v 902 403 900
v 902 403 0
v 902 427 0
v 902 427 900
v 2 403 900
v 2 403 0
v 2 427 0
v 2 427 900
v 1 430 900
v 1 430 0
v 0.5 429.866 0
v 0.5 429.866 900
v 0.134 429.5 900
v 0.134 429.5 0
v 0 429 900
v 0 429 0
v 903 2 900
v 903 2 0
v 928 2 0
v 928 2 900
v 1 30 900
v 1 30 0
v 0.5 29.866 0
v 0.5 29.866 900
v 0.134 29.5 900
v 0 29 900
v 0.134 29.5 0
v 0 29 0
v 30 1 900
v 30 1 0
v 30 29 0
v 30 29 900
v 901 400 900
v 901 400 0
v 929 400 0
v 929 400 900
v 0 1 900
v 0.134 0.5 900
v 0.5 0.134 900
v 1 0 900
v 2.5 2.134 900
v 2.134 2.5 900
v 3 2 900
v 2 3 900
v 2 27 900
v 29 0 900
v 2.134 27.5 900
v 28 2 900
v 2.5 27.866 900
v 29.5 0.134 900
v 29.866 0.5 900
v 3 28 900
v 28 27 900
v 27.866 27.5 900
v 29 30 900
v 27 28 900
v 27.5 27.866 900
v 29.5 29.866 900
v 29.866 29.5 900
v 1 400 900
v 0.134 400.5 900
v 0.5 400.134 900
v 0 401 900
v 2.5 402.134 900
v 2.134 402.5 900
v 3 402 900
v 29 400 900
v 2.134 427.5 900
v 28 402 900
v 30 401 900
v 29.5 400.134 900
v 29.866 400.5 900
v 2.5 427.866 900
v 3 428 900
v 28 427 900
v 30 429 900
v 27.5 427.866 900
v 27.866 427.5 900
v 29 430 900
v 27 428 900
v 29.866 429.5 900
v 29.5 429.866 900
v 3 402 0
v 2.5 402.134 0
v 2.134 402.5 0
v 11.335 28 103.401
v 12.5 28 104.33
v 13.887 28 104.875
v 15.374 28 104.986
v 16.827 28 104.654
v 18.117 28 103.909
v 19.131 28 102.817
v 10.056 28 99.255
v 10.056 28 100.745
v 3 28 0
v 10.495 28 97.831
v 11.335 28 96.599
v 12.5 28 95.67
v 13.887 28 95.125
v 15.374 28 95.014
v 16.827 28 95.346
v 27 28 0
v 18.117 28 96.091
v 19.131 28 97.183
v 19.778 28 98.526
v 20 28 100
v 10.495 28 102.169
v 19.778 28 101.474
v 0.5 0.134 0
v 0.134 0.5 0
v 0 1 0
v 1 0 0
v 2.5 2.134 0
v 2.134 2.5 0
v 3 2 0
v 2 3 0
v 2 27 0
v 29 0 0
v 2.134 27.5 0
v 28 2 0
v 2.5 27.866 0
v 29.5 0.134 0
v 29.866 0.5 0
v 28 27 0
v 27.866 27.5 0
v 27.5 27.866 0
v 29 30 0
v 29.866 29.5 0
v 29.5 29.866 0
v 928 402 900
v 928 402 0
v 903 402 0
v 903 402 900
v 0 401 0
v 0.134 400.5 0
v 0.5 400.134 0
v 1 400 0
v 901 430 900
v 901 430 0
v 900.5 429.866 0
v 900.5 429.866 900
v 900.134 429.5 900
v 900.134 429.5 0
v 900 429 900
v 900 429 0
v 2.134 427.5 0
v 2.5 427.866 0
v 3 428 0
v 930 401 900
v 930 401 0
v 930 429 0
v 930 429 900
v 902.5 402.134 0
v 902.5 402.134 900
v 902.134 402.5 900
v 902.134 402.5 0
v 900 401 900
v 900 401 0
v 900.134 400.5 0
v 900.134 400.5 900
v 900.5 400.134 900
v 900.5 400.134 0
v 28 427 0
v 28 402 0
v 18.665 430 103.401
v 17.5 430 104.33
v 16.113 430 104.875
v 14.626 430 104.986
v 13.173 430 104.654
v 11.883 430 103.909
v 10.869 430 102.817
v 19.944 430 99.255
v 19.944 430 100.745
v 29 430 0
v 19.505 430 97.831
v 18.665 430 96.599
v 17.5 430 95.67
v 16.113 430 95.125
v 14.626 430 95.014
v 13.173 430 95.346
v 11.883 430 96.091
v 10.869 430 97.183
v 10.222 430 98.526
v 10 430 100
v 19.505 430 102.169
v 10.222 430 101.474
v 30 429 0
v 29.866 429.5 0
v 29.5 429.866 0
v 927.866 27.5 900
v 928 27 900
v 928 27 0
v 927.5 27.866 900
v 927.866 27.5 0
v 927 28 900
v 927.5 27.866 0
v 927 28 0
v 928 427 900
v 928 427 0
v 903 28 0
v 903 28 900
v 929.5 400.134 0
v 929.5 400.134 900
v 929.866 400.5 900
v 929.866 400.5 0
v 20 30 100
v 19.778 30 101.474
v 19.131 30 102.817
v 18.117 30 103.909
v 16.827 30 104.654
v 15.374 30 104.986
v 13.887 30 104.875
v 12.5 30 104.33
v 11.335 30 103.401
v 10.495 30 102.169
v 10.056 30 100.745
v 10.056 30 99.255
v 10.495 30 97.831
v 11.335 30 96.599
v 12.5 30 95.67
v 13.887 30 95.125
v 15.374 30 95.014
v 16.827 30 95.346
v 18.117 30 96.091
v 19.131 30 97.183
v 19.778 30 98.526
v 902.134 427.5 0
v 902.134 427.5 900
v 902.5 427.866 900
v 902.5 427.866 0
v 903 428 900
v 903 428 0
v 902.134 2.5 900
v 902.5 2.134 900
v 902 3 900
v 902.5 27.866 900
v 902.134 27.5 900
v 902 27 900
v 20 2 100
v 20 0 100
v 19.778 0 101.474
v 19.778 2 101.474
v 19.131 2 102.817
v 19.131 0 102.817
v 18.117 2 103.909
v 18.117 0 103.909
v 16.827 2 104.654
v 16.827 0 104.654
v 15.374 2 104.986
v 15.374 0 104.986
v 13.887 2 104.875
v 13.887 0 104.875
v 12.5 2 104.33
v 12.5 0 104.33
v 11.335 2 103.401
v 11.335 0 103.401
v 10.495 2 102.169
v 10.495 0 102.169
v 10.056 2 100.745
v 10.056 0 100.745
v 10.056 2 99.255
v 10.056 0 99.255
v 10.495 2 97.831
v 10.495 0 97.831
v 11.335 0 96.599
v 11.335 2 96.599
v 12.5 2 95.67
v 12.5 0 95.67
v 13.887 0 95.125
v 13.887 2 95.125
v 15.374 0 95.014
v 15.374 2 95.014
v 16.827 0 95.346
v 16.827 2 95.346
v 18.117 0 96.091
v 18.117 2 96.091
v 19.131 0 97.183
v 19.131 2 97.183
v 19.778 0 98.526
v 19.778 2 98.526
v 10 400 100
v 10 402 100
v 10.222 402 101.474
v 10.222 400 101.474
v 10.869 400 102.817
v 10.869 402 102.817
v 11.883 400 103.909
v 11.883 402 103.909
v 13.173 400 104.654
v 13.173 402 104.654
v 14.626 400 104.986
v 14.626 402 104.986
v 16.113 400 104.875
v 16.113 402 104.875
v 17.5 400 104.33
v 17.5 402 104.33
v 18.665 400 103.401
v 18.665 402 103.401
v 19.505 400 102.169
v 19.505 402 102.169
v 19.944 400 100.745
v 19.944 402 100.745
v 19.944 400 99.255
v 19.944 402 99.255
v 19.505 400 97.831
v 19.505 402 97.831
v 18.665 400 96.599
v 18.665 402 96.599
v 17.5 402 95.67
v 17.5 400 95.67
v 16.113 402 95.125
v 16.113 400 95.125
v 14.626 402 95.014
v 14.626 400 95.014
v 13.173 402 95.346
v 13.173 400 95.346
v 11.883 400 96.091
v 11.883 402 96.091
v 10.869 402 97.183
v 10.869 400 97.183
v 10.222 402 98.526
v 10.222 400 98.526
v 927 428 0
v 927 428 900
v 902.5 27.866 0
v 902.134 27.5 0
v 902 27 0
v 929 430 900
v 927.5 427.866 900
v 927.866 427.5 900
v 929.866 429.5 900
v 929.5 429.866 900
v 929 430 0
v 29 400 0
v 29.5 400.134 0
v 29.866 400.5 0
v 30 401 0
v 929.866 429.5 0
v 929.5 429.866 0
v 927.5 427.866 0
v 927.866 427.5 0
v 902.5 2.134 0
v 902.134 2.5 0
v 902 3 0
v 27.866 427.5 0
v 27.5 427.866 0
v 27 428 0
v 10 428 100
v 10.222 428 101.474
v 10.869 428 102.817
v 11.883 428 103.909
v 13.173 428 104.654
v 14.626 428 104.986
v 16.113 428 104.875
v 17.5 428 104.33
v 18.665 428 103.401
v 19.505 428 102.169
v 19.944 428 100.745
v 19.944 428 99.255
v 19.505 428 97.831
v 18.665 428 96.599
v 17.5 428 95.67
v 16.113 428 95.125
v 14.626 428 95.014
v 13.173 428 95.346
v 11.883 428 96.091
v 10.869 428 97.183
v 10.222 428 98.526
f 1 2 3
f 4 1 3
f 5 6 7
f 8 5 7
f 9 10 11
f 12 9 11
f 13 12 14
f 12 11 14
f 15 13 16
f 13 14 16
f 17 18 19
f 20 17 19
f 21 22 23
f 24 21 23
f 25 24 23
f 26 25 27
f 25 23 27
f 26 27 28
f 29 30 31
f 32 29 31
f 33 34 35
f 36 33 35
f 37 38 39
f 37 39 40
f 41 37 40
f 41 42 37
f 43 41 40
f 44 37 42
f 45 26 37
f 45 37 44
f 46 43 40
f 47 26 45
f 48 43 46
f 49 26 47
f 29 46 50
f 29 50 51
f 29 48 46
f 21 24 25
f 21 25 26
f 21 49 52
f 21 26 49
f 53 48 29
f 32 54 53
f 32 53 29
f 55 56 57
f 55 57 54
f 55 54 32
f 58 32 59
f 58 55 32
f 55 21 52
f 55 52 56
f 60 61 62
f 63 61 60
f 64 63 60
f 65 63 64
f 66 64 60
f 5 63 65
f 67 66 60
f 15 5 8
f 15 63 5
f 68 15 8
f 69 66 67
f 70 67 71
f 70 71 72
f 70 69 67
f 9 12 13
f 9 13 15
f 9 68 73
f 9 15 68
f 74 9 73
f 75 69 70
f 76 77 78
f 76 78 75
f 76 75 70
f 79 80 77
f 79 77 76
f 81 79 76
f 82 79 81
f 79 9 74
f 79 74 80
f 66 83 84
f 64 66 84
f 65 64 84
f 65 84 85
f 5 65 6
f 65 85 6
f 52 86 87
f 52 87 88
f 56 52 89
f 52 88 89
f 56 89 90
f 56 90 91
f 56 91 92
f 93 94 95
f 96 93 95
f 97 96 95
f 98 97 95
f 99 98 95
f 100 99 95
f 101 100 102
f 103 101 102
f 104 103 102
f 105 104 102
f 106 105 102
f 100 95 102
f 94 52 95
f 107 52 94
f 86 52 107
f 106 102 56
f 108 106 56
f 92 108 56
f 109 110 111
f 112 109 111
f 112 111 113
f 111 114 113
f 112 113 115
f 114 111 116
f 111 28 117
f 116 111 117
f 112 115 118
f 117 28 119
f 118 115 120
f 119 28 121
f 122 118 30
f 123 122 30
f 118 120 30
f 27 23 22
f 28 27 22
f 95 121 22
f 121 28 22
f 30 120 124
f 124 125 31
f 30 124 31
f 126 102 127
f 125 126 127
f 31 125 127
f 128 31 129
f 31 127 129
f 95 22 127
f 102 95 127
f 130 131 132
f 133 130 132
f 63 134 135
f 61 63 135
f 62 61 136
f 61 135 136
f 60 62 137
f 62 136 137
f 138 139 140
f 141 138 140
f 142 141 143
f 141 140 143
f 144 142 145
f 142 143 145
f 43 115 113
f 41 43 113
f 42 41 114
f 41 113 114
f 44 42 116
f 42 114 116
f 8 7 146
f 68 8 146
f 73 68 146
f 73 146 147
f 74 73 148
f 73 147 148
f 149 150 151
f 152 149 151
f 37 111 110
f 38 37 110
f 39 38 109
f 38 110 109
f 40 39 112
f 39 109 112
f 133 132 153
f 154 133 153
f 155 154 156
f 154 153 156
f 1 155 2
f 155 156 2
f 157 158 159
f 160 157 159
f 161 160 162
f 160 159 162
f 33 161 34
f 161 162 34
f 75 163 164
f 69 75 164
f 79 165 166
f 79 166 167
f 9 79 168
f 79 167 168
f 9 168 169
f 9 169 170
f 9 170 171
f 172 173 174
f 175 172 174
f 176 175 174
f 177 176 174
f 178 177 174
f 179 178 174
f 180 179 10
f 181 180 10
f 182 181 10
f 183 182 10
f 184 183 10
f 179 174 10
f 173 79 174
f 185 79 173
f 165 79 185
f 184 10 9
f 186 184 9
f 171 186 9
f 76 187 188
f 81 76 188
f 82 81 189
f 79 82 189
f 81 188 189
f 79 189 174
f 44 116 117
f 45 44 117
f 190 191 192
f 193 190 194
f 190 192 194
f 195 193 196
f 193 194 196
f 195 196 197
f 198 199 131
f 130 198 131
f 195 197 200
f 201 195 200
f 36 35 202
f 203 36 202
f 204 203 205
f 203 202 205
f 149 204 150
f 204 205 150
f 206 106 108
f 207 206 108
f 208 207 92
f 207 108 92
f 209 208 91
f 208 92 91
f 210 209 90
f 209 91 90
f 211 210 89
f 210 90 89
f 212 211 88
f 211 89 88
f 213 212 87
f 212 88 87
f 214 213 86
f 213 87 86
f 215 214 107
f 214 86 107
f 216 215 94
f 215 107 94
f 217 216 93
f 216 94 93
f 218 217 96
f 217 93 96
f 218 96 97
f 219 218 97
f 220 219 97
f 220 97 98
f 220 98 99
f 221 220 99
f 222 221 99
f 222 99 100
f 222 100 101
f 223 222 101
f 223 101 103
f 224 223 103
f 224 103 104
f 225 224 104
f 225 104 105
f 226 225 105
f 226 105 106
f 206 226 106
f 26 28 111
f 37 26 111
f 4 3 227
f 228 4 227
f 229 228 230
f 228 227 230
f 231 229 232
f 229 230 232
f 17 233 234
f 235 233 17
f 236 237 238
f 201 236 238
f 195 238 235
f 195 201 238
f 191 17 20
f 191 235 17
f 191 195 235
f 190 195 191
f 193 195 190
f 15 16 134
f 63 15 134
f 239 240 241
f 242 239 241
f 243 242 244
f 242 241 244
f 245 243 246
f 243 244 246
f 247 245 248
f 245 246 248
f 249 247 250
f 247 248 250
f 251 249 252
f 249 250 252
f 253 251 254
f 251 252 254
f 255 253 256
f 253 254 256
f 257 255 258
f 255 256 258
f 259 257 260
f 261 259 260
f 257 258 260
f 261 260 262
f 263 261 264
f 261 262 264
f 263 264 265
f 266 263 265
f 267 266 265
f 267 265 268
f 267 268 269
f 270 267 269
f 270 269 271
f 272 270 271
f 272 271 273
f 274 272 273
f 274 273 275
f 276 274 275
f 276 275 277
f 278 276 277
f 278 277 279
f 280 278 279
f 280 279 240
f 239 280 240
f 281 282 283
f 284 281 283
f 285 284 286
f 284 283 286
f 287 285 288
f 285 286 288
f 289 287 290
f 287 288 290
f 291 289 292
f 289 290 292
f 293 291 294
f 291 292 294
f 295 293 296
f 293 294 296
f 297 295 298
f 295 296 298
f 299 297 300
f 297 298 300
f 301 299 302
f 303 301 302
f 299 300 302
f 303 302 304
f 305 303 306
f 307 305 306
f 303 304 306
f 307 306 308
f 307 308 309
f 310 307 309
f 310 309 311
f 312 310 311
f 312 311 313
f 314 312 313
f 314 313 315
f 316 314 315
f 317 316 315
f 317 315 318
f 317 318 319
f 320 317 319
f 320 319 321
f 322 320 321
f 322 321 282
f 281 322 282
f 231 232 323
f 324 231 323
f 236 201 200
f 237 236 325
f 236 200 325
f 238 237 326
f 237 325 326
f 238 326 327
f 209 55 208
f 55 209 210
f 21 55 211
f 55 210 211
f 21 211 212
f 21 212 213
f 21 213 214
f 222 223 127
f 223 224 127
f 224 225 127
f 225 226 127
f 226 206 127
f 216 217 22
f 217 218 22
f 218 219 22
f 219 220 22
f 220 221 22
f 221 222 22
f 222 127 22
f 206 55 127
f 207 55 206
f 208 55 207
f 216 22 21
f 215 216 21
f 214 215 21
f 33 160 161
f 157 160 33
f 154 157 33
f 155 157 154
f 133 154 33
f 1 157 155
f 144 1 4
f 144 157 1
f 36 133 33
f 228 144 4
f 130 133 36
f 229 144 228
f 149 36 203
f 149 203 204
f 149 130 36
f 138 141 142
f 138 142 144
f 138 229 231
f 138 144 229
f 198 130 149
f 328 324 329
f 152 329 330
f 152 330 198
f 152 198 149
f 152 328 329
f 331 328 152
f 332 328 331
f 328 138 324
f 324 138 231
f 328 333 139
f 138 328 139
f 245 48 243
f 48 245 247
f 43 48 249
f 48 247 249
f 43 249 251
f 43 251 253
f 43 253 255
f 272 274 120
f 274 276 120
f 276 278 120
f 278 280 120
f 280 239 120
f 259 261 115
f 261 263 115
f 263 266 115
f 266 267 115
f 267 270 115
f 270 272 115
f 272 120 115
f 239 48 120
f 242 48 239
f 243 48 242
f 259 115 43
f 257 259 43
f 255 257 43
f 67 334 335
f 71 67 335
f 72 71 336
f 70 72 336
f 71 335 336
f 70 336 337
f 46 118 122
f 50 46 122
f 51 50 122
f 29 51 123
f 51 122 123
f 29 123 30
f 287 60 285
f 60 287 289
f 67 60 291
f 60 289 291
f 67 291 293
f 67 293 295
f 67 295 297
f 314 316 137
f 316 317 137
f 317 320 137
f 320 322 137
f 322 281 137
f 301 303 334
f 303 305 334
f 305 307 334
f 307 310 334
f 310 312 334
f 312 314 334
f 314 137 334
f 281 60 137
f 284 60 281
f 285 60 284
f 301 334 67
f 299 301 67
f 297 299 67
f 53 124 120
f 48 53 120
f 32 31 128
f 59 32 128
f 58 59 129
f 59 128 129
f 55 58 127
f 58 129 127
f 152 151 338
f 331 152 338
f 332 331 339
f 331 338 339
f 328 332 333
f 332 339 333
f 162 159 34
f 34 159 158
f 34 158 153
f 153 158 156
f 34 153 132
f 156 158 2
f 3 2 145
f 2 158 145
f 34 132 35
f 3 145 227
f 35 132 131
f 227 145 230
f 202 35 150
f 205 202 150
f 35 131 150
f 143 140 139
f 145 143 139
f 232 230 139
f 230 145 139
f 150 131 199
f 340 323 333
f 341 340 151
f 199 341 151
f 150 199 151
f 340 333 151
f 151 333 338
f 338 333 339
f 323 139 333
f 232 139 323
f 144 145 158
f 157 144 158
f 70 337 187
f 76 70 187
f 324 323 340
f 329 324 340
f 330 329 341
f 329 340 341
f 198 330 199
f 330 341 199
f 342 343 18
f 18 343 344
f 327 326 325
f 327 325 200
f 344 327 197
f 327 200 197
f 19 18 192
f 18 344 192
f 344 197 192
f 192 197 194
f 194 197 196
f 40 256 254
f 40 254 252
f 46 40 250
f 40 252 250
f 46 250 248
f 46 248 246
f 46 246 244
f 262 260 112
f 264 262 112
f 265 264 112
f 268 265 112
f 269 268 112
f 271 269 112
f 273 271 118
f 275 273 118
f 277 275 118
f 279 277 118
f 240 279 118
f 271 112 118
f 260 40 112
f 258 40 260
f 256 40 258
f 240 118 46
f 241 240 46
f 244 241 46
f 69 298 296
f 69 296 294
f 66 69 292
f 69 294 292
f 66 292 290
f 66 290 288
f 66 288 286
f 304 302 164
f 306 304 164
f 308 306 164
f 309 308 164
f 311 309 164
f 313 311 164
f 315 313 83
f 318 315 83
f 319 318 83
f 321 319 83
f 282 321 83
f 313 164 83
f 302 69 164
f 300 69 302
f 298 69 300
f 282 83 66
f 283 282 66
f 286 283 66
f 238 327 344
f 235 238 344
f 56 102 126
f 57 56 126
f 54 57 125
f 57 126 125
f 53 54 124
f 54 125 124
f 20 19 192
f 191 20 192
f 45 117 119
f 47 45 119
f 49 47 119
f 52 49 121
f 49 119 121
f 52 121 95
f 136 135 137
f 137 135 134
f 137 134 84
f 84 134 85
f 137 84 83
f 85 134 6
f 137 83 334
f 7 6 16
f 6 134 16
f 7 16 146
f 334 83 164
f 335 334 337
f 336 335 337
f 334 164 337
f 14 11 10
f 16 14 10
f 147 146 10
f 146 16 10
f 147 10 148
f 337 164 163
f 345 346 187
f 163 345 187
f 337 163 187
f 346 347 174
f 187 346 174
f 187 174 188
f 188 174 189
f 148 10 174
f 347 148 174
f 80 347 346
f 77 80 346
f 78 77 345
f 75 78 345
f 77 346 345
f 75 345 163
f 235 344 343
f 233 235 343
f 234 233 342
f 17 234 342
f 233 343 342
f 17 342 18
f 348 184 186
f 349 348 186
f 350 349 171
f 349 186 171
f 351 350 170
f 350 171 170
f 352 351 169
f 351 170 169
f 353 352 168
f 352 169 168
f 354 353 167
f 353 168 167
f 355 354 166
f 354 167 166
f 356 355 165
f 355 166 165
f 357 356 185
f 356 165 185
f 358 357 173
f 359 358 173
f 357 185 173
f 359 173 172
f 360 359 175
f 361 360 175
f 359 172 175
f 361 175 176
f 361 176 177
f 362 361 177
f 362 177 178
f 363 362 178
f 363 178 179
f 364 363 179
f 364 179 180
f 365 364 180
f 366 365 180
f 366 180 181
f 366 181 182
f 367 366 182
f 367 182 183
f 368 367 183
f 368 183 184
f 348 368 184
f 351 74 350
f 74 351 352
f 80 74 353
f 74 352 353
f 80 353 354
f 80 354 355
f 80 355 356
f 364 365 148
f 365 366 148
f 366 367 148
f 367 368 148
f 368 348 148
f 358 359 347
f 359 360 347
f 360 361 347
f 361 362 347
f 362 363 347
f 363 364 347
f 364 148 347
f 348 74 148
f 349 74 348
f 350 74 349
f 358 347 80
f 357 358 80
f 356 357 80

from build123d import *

# Parameters (mm, degrees)
F2_DEPTH = 900
F3_R     = 5
F4_DEPTH = 30
F5_R     = 5
F6_DEPTH = 30
F7_DEPTH = 25


with BuildPart() as f2:
    # F0 (on Top) → F2 (new body)
    with BuildSketch(Plane.XY):
        with BuildLine():
            ThreePointArc((0, 1), (0.2928932188, 0.2928932188), (1, 0))
            Line((1, 0), (29, 0))
            ThreePointArc((29, 0), (29.7071067812, 0.2928932188), (30, 1))
            Line((30, 1), (30, 29))
            ThreePointArc((30, 29), (29.7071067812, 29.7071067812), (29, 30))
            Line((29, 30), (1, 30))
            ThreePointArc((1, 30), (0.2928932188, 29.7071067812), (0, 29))
            Line((0, 29), (0, 1))
        make_face()
        with BuildLine():
            Line((3, 28), (27, 28))
            ThreePointArc((27, 28), (27.7071067812, 27.7071067812), (28, 27))
            Line((28, 27), (28, 2))
            Line((28, 2), (3, 2))
            ThreePointArc((3, 2), (2.2928932188, 2.2928932188), (2, 3))
            Line((2, 3), (2, 27))
            ThreePointArc((2, 27), (2.2928932188, 27.7071067812), (3, 28))
        make_face(mode=Mode.SUBTRACT)
    extrude(amount=F2_DEPTH)

    # F3 (on face) → F4 (cut)
    with BuildSketch(Plane.XZ):
        with Locations((15, 100)):
            Circle(F3_R)
    extrude(amount=-F4_DEPTH, mode=Mode.SUBTRACT)

    # F0 (on Top) → F7 (cut)
    with BuildSketch(Plane.XY):
        with BuildLine():
            ThreePointArc((28, 27), (27.7071067812, 27.7071067812), (27, 28))
            Line((27, 28), (3, 28))
            ThreePointArc((3, 28), (2.2928932188, 27.7071067812), (2, 27))
            Line((2, 27), (2, 3))
            ThreePointArc((2, 3), (2.2928932188, 2.2928932188), (3, 2))
            Line((3, 2), (28, 2))
            Line((28, 2), (28, 27))
        make_face()
    extrude(amount=-F7_DEPTH, mode=Mode.SUBTRACT)


with BuildPart() as f2b:
    # F0 (on Top) → F2, piece 2 (new body)
    with BuildSketch(Plane.XY):
        with BuildLine():
            ThreePointArc((29, 400), (29.7071067812, 400.2928932188), (30, 401))
            Line((30, 401), (30, 429))
            ThreePointArc((30, 429), (29.7071067812, 429.7071067812), (29, 430))
            Line((29, 430), (1, 430))
            ThreePointArc((1, 430), (0.2928932188, 429.7071067812), (0, 429))
            Line((0, 429), (0, 401))
            ThreePointArc((0, 401), (0.2928932188, 400.2928932188), (1, 400))
            Line((1, 400), (29, 400))
        make_face()
        with BuildLine():
            Line((3, 428), (27, 428))
            ThreePointArc((27, 428), (27.7071067812, 427.7071067812), (28, 427))
            Line((28, 427), (28, 402))
            Line((28, 402), (3, 402))
            ThreePointArc((3, 402), (2.2928932188, 402.2928932188), (2, 403))
            Line((2, 403), (2, 427))
            ThreePointArc((2, 427), (2.2928932188, 427.7071067812), (3, 428))
        make_face(mode=Mode.SUBTRACT)
    extrude(amount=F2_DEPTH)

    # F5 (on face) → F6 (cut)
    with BuildSketch(Plane(origin=(0, 430, 0), x_dir=(-1, 0, 0), z_dir=(0, 1, 0))):
        with Locations((-15, 100)):
            Circle(F5_R)
    extrude(amount=-F6_DEPTH, mode=Mode.SUBTRACT)


with BuildPart() as f2c:
    # F0 (on Top) → F2, piece 3 (new body)
    with BuildSketch(Plane.XY):
        with BuildLine():
            ThreePointArc((928, 27), (927.7071067812, 27.7071067812), (927, 28))
            Line((927, 28), (903, 28))
            ThreePointArc((903, 28), (902.2928932188, 27.7071067812), (902, 27))
            Line((902, 27), (902, 3))
            ThreePointArc((902, 3), (902.2928932188, 2.2928932188), (903, 2))
            Line((903, 2), (928, 2))
            Line((928, 2), (928, 27))
        make_face()
    extrude(amount=F2_DEPTH)


with BuildPart() as f2d:
    # F0 (on Top) → F2, piece 4 (new body)
    with BuildSketch(Plane.XY):
        with BuildLine():
            ThreePointArc((929, 400), (929.7071067812, 400.2928932188), (930, 401))
            Line((930, 401), (930, 429))
            ThreePointArc((930, 429), (929.7071067812, 429.7071067812), (929, 430))
            Line((929, 430), (901, 430))
            ThreePointArc((901, 430), (900.2928932188, 429.7071067812), (900, 429))
            Line((900, 429), (900, 401))
            ThreePointArc((900, 401), (900.2928932188, 400.2928932188), (901, 400))
            Line((901, 400), (929, 400))
        make_face()
        with BuildLine():
            Line((903, 428), (927, 428))
            ThreePointArc((927, 428), (927.7071067812, 427.7071067812), (928, 427))
            Line((928, 427), (928, 402))
            Line((928, 402), (903, 402))
            ThreePointArc((903, 402), (902.2928932188, 402.2928932188), (902, 403))
            Line((902, 403), (902, 427))
            ThreePointArc((902, 427), (902.2928932188, 427.7071067812), (903, 428))
        make_face(mode=Mode.SUBTRACT)
    extrude(amount=F2_DEPTH)


solid = Compound([f2.part, f2b.part, f2c.part, f2d.part])
